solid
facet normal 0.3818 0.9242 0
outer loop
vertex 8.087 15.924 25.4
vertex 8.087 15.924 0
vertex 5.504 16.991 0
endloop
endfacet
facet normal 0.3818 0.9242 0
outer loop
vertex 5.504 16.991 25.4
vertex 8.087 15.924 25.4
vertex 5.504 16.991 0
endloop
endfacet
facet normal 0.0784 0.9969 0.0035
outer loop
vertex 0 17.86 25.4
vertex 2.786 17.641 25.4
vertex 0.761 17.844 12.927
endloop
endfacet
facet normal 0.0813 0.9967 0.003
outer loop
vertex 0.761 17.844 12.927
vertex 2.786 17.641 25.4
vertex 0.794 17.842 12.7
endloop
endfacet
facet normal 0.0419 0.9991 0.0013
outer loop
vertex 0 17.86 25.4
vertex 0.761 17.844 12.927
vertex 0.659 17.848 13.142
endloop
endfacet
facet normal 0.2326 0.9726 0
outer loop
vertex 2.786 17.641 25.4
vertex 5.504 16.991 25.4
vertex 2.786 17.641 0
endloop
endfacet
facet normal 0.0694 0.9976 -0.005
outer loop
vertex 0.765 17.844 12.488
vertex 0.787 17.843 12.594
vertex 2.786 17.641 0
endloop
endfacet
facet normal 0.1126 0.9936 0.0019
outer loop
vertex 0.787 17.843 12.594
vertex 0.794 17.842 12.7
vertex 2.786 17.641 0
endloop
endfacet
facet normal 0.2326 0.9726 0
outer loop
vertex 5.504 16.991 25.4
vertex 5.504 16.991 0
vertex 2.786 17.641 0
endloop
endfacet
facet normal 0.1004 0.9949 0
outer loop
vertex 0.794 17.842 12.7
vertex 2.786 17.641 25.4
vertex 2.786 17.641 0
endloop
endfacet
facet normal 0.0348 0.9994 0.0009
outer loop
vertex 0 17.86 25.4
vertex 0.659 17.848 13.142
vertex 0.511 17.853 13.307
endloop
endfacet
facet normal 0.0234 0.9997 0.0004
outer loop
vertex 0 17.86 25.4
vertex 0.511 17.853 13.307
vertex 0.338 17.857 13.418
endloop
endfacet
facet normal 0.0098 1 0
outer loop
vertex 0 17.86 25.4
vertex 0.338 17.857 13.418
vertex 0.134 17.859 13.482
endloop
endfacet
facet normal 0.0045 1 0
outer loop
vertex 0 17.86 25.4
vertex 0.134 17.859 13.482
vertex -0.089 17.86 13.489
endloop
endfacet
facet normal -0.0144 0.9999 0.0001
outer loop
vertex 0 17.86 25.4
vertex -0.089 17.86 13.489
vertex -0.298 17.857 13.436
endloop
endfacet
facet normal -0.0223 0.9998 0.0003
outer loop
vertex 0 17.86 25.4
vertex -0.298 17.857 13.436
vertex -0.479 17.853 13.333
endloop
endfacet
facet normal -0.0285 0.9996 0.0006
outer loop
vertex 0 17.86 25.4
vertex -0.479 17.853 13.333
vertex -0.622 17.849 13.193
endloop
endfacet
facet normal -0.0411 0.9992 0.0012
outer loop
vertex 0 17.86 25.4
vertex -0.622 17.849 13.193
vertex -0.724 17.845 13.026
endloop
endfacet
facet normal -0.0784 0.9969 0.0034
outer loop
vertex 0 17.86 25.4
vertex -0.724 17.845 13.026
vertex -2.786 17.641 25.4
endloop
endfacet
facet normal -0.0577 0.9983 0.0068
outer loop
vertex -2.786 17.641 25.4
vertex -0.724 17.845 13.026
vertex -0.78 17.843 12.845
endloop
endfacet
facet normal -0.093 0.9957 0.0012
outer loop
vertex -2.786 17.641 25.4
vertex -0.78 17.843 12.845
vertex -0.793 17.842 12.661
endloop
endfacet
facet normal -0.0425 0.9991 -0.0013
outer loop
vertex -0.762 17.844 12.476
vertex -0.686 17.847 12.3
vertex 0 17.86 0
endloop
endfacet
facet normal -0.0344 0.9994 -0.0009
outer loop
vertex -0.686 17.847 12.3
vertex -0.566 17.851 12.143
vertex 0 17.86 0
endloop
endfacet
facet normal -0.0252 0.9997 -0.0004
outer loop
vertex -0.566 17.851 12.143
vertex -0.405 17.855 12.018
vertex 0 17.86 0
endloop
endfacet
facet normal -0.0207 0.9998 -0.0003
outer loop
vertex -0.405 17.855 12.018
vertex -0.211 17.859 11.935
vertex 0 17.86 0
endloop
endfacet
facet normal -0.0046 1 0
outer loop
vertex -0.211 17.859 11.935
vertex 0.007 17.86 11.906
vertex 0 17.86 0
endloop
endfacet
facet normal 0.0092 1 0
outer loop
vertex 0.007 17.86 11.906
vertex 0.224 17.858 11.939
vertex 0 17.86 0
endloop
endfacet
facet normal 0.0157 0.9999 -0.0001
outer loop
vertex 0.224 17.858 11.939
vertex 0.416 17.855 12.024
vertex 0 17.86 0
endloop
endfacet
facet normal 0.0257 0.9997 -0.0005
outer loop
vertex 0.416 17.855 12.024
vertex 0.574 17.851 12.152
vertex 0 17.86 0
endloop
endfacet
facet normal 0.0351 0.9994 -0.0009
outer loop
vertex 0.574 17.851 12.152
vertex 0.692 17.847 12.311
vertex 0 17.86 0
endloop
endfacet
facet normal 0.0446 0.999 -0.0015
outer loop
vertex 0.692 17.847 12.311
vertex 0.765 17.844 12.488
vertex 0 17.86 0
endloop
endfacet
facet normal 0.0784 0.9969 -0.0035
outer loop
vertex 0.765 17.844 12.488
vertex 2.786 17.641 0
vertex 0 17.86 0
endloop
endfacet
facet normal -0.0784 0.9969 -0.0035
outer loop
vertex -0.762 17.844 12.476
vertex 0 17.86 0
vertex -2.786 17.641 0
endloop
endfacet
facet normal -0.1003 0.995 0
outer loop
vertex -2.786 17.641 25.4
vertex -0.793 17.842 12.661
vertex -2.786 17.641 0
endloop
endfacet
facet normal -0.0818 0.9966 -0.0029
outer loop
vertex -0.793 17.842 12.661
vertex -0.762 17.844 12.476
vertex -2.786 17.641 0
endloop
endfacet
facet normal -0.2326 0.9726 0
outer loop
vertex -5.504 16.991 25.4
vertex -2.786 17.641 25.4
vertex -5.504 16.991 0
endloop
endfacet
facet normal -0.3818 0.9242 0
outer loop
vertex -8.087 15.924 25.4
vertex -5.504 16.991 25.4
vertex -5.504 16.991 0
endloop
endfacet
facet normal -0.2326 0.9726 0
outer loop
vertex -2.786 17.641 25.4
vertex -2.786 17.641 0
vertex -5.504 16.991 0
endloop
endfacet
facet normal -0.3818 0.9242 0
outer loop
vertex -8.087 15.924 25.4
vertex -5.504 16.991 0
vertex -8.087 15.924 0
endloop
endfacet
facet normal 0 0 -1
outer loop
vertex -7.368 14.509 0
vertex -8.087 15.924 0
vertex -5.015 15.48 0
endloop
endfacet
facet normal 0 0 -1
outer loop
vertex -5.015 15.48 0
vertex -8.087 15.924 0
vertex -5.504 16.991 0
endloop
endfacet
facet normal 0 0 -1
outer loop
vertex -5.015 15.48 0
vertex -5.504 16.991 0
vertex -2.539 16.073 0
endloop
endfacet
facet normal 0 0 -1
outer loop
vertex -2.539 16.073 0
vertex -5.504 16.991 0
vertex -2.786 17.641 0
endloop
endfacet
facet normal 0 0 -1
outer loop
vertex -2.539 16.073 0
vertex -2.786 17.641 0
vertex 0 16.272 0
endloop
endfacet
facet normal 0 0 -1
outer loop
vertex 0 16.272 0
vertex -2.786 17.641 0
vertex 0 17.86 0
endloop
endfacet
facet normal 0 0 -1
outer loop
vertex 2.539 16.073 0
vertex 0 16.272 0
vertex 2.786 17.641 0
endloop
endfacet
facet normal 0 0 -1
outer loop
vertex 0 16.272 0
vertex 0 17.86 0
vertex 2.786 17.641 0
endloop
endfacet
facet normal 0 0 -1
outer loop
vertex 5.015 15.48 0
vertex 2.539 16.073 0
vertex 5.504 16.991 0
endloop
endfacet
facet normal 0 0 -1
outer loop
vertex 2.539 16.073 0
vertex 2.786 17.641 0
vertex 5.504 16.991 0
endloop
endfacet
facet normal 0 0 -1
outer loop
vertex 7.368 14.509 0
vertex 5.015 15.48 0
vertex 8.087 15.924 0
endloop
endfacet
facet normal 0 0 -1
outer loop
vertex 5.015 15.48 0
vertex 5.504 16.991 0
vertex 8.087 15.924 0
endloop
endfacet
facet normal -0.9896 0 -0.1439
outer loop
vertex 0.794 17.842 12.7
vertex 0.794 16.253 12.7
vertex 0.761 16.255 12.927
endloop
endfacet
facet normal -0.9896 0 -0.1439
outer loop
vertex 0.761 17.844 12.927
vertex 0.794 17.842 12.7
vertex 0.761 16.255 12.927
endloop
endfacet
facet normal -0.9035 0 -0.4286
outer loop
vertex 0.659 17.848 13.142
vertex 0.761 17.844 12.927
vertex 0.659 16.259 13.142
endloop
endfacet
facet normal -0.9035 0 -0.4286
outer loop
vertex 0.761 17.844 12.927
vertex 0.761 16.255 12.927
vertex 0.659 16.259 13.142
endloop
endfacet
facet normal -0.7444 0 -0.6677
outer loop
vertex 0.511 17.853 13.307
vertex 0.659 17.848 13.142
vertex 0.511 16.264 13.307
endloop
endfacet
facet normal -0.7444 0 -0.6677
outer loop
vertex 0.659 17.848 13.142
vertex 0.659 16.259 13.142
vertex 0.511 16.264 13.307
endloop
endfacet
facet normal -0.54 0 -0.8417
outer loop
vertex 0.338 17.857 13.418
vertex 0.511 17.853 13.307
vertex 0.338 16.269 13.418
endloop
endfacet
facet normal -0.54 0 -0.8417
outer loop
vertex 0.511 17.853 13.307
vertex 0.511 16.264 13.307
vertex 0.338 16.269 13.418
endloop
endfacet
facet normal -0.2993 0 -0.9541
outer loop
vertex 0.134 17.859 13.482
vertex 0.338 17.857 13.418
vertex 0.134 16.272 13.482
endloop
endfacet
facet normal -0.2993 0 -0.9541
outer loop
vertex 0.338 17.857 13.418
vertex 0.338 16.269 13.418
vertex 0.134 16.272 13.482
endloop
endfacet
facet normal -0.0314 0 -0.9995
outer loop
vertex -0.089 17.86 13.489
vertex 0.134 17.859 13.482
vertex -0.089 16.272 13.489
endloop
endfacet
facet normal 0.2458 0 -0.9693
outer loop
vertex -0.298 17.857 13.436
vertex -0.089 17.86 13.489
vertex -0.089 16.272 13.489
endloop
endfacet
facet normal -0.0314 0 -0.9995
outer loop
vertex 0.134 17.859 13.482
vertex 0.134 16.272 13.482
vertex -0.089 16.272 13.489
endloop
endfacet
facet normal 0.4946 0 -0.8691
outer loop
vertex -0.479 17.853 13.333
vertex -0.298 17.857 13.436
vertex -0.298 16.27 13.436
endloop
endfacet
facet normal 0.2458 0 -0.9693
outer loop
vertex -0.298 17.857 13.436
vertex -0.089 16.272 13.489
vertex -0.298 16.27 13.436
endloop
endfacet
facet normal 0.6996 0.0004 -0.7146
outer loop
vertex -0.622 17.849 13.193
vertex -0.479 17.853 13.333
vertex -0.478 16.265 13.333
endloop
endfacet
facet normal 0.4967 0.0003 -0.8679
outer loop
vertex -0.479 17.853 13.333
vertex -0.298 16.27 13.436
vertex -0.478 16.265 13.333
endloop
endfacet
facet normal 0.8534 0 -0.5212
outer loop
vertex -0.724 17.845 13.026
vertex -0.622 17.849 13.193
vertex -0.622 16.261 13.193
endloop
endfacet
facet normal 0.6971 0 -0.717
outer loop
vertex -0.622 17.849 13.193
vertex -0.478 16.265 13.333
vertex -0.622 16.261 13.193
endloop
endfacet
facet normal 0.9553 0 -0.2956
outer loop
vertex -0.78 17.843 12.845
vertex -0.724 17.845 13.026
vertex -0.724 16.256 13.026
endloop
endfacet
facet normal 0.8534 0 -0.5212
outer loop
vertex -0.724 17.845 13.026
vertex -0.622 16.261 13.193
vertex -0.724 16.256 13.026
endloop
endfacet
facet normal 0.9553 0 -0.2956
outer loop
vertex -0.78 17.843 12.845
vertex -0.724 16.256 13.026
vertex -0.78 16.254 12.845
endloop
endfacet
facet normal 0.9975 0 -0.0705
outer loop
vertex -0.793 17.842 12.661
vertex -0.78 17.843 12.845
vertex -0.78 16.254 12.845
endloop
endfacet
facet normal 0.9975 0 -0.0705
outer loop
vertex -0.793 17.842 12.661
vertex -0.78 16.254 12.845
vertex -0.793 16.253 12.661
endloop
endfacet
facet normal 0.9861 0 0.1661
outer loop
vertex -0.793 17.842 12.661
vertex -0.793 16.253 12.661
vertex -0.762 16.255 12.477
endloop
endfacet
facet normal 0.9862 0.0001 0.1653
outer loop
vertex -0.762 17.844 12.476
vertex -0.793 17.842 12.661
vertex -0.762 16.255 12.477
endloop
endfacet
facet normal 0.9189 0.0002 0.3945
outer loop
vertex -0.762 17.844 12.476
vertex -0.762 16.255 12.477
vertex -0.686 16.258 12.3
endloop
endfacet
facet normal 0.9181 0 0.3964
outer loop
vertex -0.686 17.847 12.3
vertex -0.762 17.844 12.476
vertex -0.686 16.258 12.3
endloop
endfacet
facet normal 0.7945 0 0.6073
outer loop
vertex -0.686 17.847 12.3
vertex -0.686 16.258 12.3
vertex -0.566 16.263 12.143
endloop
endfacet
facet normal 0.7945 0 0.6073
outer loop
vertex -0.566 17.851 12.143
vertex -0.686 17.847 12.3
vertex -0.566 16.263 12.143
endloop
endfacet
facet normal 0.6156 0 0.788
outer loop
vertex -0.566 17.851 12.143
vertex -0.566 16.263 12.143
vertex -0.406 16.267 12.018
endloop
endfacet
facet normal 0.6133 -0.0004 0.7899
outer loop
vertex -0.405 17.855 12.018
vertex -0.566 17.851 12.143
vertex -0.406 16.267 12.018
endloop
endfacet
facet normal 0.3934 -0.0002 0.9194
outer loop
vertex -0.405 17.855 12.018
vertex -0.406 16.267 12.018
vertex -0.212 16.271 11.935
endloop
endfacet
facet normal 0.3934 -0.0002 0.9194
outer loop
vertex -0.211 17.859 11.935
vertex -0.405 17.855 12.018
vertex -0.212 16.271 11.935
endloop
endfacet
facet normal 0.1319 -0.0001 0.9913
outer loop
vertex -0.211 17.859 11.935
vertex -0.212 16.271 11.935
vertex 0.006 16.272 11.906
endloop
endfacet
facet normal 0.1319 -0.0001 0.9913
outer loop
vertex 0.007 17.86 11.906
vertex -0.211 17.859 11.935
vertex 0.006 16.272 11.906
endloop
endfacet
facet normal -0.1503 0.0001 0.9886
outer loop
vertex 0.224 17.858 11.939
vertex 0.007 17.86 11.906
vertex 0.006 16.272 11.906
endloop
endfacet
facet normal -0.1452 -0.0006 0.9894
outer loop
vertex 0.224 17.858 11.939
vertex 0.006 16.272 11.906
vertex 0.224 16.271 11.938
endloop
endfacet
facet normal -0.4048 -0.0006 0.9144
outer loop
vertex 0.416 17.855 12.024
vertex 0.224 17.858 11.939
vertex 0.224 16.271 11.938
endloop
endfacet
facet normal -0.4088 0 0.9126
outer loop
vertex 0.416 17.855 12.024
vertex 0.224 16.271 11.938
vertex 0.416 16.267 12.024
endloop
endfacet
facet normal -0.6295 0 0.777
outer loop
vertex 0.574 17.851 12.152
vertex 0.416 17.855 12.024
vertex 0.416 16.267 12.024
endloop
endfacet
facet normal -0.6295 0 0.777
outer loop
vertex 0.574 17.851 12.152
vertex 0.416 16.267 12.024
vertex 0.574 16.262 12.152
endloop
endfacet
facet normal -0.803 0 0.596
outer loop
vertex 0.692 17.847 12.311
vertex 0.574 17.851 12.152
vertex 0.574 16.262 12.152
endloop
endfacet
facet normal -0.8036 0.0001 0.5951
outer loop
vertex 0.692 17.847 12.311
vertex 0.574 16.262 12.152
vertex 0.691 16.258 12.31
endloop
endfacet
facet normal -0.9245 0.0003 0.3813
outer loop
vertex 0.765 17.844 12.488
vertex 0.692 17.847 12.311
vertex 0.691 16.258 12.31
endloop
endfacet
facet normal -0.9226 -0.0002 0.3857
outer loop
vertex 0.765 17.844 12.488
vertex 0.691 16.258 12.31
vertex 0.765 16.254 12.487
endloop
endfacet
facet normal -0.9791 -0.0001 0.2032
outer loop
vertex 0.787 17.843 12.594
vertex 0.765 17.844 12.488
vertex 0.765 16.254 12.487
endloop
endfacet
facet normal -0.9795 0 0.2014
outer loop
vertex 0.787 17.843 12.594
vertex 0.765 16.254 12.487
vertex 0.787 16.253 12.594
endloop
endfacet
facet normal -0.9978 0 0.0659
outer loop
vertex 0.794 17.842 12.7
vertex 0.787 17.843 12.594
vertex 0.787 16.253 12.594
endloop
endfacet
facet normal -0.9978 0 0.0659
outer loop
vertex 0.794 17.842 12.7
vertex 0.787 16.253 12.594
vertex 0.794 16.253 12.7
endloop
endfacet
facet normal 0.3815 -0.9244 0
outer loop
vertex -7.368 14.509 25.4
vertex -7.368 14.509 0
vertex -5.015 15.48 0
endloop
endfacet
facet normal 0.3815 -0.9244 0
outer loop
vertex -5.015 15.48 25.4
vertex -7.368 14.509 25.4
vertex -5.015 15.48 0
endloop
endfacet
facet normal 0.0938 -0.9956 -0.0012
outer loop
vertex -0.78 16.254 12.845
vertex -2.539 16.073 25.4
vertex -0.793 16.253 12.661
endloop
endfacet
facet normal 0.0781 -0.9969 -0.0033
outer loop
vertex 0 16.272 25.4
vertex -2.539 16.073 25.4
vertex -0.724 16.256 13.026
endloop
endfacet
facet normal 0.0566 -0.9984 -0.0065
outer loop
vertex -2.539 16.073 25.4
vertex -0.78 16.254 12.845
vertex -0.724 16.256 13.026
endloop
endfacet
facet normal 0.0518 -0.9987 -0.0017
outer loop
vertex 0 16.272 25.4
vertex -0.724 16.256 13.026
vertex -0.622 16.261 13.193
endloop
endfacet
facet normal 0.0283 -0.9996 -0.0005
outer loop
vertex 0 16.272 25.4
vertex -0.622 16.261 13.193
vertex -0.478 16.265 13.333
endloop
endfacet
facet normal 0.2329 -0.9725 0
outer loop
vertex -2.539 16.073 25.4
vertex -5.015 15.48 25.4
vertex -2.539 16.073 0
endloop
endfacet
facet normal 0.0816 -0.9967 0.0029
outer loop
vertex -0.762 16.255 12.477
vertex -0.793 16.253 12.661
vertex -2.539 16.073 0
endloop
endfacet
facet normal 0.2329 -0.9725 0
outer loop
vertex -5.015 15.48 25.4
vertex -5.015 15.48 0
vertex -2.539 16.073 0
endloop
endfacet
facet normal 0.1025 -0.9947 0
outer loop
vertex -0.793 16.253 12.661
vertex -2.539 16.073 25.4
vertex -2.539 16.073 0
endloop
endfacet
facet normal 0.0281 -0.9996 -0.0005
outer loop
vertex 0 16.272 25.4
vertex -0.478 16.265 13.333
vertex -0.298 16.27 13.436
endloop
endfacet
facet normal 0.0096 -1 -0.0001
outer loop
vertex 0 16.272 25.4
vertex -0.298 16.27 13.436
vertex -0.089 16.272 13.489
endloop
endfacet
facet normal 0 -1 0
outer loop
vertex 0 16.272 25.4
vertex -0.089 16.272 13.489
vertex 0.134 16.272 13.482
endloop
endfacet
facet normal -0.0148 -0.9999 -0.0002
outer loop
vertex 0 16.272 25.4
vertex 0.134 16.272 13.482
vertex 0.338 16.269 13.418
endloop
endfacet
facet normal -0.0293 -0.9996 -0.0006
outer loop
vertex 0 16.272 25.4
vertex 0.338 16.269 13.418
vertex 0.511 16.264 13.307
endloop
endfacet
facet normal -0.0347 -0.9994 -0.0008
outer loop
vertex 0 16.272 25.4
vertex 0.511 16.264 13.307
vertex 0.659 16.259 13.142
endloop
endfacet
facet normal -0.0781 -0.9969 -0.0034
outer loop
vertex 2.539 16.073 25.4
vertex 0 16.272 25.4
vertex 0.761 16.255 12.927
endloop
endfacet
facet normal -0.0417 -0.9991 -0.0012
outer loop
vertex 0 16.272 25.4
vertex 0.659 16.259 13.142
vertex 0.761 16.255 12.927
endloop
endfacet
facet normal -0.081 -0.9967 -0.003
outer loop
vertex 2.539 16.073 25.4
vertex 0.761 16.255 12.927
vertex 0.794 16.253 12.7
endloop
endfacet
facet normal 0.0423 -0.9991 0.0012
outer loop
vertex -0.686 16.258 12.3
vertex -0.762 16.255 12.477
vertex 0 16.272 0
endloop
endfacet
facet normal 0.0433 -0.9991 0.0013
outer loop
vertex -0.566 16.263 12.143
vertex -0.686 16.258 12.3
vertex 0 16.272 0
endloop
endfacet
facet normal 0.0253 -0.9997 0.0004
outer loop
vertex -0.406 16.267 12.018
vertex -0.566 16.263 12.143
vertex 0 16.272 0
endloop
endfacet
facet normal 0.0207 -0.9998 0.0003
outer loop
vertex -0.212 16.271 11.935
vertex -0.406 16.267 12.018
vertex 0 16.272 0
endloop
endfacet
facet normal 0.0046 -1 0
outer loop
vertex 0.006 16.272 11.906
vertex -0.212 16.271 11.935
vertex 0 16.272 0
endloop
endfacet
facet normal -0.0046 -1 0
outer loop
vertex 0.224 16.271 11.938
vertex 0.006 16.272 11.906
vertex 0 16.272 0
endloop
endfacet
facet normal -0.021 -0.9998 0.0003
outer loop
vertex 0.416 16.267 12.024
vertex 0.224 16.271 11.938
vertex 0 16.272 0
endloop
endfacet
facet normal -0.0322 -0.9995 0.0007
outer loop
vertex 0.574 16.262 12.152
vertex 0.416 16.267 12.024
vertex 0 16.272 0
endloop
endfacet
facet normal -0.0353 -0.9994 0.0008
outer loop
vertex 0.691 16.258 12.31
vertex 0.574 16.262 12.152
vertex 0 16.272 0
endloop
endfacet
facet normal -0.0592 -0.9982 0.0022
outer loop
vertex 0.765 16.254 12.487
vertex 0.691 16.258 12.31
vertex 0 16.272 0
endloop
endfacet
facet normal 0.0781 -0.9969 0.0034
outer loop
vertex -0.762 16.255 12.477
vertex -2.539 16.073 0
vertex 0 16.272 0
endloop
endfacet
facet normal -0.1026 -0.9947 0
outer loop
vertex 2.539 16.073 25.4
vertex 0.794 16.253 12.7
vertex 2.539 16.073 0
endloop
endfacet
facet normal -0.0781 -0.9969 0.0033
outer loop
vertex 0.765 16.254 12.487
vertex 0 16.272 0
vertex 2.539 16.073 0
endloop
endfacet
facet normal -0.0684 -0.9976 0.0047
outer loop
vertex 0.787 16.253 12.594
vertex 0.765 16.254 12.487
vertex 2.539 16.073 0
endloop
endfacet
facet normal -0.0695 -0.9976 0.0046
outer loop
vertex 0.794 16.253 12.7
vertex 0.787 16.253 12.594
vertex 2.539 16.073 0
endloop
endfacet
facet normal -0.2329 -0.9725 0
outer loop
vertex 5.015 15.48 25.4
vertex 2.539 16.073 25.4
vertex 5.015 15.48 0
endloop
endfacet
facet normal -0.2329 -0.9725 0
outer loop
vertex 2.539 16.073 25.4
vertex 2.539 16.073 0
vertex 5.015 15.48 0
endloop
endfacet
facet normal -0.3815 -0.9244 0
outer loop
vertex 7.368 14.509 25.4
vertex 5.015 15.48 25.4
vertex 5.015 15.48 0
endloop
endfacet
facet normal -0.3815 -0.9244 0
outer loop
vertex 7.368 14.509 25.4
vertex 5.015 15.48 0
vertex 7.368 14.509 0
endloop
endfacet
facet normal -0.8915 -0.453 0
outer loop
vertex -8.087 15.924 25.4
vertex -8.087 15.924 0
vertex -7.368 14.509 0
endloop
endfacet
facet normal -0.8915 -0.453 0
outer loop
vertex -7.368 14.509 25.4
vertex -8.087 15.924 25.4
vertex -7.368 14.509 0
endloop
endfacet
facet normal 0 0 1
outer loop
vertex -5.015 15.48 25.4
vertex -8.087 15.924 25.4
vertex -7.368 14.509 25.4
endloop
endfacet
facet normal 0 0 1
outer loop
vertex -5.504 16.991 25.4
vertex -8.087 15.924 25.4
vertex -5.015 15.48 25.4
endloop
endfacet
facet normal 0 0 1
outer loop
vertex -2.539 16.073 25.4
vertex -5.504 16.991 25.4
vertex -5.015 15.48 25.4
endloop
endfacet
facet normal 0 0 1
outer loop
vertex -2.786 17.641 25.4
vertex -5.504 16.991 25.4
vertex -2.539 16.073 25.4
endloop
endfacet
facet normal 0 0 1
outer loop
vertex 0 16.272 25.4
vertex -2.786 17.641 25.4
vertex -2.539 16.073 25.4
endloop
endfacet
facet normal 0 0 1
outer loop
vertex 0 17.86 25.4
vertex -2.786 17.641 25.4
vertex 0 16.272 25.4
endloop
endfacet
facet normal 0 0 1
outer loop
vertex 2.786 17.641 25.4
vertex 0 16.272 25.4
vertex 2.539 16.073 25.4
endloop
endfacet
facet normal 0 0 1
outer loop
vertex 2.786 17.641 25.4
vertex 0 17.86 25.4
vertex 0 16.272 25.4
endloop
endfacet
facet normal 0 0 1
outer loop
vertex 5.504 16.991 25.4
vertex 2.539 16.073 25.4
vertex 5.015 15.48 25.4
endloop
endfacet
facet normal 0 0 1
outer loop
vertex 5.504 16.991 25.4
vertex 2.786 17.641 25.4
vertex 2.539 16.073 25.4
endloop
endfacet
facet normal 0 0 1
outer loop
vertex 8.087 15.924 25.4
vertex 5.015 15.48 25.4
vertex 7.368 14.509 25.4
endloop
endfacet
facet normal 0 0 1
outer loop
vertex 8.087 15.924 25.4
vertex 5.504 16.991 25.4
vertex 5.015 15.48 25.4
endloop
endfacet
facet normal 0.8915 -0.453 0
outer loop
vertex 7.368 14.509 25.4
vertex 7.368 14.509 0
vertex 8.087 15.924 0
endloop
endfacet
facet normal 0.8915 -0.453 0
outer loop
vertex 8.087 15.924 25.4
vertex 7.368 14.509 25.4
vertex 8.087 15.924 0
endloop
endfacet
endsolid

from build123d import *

# Parameters (mm, degrees)
F1_DEPTH = 25.4
F2_R     = 0.79375
F3_DEPTH = 18.8599085


with BuildPart() as f1:
    # F0 (on Top) → F1 (new body)
    with BuildSketch(Plane.XY):
        with BuildLine():
            ThreePointArc((-7.3684509074, 14.5085218531), (0, 16.2724084), (7.3684509074, 14.5085218531))
            Line((7.3684509074, 14.5085218531), (8.0873006024, 15.9239410016))
            ThreePointArc((8.0873006024, 15.9239410016), (0, 17.8599084), (-8.0873006024, 15.9239410016))
            Line((-8.0873006024, 15.9239410016), (-7.3684509074, 14.5085218531))
        make_face()
    extrude(amount=F1_DEPTH)

    # F2 (on Front) → F3 (cut, up to face)
    with BuildSketch(Plane.XZ):
        with Locations((0, 12.7)):
            Circle(F2_R)
    extrude(amount=-F3_DEPTH, mode=Mode.SUBTRACT)


solid = f1.part
